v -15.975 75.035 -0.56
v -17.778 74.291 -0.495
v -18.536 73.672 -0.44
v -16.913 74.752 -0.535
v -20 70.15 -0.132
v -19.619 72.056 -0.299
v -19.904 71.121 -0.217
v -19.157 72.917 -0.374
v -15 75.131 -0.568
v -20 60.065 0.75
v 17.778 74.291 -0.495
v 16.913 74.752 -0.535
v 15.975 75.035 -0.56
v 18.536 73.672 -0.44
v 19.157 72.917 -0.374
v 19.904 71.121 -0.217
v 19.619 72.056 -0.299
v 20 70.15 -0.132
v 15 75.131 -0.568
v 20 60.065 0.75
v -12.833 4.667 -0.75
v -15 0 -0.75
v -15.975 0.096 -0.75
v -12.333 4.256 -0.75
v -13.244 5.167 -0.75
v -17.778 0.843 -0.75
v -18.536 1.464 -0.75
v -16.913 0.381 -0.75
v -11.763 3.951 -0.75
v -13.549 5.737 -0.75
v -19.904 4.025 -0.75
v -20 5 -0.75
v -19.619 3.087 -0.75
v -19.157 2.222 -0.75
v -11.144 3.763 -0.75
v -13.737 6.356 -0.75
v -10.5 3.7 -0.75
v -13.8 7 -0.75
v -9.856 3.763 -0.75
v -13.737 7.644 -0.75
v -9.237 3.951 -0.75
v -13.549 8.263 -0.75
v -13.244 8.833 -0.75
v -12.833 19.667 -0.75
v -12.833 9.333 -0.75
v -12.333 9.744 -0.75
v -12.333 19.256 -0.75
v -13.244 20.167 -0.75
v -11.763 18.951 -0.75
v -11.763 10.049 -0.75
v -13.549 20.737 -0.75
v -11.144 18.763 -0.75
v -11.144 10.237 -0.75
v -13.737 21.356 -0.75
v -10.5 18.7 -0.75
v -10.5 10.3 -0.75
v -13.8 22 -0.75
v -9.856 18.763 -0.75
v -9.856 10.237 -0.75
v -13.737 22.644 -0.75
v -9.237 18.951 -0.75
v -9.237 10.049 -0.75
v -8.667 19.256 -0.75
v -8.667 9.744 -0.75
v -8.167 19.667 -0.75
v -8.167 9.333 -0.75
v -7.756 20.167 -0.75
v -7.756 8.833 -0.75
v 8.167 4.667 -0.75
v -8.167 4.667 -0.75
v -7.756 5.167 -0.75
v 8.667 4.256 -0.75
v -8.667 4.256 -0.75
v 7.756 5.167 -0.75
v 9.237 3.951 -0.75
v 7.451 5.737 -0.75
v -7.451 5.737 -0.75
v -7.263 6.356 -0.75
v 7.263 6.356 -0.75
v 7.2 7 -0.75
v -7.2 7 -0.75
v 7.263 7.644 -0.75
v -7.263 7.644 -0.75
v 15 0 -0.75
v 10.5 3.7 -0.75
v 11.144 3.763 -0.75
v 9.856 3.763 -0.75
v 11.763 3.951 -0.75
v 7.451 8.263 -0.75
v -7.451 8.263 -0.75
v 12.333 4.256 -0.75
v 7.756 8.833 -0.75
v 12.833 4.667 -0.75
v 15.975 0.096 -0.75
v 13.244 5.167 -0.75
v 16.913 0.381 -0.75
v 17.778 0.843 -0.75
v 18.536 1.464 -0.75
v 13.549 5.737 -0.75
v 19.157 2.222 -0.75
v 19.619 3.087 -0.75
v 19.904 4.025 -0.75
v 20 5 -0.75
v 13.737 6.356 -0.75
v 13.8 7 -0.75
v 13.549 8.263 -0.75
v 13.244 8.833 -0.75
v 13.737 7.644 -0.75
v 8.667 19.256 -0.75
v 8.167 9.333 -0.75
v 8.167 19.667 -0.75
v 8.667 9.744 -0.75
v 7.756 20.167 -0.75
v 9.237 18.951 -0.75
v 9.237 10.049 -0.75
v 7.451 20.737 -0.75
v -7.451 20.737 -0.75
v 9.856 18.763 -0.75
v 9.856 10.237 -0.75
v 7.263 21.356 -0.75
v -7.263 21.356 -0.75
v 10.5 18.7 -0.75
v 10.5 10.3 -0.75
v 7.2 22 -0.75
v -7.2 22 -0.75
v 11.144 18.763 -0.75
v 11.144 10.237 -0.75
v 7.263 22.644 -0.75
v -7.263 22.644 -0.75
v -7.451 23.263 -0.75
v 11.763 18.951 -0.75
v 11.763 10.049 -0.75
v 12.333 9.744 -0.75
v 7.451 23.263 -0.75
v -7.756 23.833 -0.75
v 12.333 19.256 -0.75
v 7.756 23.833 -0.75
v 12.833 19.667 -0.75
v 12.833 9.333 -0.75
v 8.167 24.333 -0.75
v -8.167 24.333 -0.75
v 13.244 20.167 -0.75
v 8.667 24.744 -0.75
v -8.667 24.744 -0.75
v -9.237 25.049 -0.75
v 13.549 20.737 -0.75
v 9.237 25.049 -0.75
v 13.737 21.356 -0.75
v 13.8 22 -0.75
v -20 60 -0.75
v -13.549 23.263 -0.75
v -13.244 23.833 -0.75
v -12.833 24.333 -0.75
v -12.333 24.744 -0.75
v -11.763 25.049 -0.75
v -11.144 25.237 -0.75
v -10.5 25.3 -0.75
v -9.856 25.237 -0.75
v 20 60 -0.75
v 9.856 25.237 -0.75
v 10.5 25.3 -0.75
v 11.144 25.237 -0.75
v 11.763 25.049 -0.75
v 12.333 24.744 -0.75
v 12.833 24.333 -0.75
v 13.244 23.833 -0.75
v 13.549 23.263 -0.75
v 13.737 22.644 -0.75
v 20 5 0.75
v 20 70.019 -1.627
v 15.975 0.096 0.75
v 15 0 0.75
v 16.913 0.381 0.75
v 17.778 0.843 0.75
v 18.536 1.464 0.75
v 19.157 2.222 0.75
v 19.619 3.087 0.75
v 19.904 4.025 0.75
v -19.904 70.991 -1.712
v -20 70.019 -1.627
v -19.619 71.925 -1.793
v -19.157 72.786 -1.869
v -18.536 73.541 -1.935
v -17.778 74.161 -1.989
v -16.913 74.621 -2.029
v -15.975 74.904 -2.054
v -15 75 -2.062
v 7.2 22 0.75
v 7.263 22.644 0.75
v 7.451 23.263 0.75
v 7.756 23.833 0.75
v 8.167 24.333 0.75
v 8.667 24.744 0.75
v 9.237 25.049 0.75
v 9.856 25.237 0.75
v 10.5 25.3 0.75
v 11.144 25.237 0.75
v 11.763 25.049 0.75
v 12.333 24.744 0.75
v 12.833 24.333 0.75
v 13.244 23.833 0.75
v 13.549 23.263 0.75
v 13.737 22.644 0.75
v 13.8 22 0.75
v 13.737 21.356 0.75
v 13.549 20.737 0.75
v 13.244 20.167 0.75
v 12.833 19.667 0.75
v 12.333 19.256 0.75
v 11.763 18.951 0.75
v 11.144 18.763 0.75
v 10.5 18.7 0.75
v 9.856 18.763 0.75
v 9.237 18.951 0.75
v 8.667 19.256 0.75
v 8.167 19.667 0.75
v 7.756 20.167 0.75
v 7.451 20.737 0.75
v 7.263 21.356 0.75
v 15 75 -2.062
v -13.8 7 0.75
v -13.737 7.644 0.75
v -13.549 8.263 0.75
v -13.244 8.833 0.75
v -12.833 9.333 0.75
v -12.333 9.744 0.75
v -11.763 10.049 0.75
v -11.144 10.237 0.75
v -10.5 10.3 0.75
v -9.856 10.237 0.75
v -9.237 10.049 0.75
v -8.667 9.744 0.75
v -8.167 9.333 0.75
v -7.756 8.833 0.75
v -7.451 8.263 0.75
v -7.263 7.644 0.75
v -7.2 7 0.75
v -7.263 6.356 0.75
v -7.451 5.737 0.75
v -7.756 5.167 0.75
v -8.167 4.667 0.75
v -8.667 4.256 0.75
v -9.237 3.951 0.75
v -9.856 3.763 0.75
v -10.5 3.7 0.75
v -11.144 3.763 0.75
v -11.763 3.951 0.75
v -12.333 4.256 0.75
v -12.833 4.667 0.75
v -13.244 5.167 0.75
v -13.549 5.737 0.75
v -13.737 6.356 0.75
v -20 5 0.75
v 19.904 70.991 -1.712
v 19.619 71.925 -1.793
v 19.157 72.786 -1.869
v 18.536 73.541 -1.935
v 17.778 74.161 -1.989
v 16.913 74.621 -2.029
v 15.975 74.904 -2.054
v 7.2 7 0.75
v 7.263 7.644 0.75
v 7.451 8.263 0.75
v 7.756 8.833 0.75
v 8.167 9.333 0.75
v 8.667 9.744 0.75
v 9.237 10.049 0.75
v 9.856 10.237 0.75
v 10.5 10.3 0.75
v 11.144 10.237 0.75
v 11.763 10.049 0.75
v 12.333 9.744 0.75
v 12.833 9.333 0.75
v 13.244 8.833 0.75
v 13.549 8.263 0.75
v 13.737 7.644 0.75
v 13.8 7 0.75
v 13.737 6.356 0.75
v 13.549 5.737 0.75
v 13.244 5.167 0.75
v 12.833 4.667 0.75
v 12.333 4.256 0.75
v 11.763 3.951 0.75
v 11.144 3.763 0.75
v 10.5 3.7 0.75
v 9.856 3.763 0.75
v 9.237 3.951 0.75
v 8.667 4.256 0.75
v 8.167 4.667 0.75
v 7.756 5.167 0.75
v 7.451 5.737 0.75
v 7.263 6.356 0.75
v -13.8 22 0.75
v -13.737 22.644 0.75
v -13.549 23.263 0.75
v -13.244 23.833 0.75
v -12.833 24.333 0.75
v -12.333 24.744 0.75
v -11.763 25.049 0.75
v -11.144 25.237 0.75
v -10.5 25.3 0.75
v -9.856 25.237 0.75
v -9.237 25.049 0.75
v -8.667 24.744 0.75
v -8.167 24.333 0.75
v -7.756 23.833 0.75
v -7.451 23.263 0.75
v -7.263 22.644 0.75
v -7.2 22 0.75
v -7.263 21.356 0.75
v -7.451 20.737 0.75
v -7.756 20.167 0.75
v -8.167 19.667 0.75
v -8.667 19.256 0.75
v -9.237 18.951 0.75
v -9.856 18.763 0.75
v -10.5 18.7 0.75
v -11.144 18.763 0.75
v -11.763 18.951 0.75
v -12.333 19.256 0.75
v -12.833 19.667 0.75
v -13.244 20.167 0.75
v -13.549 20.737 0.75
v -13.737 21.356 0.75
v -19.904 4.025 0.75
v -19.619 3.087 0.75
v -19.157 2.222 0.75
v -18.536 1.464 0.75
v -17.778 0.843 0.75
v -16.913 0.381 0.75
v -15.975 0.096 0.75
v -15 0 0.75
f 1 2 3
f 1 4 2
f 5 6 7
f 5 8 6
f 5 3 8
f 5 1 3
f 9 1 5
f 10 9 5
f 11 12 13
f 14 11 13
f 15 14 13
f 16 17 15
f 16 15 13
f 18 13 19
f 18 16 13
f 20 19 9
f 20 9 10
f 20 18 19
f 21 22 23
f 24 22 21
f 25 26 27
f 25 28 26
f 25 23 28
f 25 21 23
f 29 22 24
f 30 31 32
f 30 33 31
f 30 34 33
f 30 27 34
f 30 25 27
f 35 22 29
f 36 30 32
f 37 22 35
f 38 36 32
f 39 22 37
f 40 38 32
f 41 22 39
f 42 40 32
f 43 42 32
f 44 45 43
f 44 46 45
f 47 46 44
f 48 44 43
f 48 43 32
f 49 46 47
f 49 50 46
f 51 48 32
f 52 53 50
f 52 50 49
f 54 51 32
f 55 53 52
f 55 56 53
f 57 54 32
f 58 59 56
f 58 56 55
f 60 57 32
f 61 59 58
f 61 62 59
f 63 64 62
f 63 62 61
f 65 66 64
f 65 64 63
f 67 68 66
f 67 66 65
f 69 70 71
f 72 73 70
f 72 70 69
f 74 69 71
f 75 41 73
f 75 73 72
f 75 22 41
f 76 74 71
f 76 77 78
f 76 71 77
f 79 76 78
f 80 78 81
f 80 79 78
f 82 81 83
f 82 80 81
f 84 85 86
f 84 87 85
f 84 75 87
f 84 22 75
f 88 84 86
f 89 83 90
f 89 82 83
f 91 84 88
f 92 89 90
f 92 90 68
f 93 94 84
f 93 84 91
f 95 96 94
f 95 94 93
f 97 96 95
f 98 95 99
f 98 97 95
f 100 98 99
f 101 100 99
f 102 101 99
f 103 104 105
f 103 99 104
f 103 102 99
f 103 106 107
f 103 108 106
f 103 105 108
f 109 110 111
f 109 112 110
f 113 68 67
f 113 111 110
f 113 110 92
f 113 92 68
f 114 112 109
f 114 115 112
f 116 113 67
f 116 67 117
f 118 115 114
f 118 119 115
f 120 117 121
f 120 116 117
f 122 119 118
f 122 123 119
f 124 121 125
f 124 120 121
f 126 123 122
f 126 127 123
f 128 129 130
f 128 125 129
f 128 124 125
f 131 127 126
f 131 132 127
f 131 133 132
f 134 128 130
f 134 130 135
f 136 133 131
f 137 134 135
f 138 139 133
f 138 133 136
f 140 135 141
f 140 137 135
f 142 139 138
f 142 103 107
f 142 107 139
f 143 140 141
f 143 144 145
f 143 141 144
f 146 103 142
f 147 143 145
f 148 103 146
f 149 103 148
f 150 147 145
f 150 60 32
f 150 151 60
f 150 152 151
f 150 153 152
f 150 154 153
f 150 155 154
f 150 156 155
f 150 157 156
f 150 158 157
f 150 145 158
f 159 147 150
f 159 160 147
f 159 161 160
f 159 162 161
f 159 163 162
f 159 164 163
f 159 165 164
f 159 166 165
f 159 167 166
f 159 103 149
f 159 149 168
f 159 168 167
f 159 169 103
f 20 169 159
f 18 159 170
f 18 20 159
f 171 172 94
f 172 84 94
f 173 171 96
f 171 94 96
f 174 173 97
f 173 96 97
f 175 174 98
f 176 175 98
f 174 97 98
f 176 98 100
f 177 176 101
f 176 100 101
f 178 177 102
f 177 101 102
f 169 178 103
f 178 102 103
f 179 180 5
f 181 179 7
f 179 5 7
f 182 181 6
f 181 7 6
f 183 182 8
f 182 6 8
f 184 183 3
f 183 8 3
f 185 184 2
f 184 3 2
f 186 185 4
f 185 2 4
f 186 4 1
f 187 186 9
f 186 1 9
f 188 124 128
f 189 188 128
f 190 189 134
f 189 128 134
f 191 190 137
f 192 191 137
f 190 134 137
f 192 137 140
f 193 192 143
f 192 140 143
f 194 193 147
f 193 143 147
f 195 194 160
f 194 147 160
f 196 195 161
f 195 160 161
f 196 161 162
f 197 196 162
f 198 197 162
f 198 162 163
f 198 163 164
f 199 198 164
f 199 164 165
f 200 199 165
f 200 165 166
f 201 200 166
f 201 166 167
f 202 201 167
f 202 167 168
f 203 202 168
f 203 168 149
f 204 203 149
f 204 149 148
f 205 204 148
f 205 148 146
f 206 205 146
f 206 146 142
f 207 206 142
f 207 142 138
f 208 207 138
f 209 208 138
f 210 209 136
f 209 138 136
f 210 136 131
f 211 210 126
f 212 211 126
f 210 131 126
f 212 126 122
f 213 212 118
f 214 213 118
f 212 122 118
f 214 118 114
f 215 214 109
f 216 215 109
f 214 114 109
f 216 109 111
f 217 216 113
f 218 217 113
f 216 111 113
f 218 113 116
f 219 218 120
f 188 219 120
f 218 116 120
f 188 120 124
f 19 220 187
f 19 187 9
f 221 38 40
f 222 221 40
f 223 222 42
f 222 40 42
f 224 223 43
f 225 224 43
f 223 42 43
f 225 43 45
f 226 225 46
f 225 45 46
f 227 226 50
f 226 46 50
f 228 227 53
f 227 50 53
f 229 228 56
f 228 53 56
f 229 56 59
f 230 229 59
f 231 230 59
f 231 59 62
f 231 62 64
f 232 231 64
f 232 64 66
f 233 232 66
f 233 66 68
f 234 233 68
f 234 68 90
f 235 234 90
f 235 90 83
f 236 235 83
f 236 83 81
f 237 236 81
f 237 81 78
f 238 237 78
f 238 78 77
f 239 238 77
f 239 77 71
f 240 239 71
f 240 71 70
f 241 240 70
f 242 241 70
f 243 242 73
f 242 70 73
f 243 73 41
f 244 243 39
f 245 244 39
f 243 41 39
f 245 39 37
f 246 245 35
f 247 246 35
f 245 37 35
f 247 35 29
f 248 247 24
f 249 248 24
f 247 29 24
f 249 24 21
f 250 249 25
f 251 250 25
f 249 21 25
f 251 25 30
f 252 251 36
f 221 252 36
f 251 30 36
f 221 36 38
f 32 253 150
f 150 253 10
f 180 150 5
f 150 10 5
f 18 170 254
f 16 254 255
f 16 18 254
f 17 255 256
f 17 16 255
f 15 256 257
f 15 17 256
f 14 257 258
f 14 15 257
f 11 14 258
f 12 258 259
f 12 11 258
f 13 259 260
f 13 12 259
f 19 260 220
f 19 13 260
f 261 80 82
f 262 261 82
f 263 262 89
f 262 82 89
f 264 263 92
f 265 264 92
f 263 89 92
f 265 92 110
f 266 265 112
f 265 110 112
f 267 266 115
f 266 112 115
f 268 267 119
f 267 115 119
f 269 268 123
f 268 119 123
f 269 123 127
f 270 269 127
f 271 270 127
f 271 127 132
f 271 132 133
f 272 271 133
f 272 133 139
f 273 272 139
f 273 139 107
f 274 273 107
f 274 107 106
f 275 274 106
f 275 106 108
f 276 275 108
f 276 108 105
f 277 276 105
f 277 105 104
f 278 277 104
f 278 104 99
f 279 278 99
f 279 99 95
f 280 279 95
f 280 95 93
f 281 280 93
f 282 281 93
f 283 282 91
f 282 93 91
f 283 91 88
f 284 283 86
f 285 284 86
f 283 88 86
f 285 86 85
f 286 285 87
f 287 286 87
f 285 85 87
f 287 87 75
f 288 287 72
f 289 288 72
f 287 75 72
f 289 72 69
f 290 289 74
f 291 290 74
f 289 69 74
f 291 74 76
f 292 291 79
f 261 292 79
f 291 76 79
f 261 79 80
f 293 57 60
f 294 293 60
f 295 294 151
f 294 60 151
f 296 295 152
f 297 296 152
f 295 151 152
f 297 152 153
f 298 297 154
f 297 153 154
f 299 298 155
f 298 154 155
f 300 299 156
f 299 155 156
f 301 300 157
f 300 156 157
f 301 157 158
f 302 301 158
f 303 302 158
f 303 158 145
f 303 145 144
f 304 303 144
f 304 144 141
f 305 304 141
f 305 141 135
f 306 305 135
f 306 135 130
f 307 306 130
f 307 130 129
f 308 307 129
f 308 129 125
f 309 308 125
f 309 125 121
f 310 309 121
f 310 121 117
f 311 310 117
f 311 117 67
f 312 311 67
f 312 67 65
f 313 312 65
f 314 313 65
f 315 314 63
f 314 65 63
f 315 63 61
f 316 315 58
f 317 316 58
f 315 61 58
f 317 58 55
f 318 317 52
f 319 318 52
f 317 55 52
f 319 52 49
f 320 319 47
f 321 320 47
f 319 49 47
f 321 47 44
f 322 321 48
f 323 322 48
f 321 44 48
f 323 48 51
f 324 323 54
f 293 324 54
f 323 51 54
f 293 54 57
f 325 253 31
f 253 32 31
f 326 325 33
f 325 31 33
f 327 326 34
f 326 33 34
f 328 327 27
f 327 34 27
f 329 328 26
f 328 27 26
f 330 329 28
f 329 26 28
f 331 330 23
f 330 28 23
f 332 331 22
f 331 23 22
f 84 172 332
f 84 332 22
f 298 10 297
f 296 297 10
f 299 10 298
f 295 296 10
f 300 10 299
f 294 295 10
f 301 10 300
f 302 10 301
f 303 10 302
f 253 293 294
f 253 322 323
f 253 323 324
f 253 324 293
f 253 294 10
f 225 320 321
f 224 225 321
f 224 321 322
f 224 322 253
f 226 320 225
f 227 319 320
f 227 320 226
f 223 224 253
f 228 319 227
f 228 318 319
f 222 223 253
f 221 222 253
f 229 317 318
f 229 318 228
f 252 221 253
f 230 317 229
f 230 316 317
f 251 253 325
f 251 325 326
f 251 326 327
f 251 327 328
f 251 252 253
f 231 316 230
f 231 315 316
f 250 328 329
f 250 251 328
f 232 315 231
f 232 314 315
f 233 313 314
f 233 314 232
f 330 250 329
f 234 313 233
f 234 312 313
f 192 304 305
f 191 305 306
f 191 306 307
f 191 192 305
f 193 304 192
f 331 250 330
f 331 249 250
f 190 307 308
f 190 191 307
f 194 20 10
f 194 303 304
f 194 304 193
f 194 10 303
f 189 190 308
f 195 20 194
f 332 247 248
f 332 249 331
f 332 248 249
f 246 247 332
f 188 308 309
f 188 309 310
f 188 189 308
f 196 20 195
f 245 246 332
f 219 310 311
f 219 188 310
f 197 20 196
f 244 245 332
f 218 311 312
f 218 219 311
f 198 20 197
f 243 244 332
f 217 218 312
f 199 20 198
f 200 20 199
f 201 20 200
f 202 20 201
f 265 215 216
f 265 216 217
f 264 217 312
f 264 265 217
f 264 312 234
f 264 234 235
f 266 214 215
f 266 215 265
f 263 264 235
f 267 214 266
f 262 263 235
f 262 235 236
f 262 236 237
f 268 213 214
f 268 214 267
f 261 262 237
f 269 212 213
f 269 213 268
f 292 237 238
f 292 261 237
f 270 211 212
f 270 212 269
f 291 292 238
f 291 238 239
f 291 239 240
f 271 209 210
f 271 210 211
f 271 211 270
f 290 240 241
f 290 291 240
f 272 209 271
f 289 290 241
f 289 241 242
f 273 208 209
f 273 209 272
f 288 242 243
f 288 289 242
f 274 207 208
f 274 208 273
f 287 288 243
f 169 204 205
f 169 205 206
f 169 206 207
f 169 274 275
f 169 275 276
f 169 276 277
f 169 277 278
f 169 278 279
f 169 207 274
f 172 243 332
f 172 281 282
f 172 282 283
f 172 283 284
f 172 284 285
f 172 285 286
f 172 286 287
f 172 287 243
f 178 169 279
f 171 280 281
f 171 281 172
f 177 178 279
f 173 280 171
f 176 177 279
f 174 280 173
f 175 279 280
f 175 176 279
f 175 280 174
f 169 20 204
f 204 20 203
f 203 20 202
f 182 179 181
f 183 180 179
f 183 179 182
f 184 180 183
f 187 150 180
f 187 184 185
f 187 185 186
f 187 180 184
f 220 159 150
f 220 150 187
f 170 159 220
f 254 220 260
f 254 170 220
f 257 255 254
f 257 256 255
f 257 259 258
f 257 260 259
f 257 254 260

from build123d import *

# Parameters (mm, degrees)
F1_DEPTH = 20
F3_D     = 6.6
F3_DEPTH = 43
F3_TIP   = 1.9828400428
F4_R     = 5


with BuildPart() as f1:
    # F0 (on Right) → F1 (new body, symmetric)
    with BuildSketch(Plane.YZ):
        Polygon((0, 0), (0, -0.75), (60, -0.75), (75, -2.0623299529), (75.1307336141, -0.5680379058), (60.0654914144, 0.75), (0, 0.75), align=None)
    extrude(amount=F1_DEPTH, both=True)

    # F3
    with Locations(Plane.XY.offset(0.75)):
        with Locations((-10.5, 7), (10.5, 7), (10.5, 22), (-10.5, 22)):
            Hole(F3_D / 2, depth=F3_DEPTH)
            with Locations((0, 0, -(F3_DEPTH + F3_TIP / 2))):  # 118° drill point
                Cone(0, F3_D / 2, F3_TIP, mode=Mode.SUBTRACT)

    # F4
    f4_edges = [f1.edges().sort_by_distance(p)[0] for p in [
        (20, 75.065367, -1.315184),
        (-20, 75.065367, -1.315184),
        (20, 0, 0),
        (-20, 0, 0),
    ]]
    fillet(f4_edges, radius=F4_R)


solid = f1.part
